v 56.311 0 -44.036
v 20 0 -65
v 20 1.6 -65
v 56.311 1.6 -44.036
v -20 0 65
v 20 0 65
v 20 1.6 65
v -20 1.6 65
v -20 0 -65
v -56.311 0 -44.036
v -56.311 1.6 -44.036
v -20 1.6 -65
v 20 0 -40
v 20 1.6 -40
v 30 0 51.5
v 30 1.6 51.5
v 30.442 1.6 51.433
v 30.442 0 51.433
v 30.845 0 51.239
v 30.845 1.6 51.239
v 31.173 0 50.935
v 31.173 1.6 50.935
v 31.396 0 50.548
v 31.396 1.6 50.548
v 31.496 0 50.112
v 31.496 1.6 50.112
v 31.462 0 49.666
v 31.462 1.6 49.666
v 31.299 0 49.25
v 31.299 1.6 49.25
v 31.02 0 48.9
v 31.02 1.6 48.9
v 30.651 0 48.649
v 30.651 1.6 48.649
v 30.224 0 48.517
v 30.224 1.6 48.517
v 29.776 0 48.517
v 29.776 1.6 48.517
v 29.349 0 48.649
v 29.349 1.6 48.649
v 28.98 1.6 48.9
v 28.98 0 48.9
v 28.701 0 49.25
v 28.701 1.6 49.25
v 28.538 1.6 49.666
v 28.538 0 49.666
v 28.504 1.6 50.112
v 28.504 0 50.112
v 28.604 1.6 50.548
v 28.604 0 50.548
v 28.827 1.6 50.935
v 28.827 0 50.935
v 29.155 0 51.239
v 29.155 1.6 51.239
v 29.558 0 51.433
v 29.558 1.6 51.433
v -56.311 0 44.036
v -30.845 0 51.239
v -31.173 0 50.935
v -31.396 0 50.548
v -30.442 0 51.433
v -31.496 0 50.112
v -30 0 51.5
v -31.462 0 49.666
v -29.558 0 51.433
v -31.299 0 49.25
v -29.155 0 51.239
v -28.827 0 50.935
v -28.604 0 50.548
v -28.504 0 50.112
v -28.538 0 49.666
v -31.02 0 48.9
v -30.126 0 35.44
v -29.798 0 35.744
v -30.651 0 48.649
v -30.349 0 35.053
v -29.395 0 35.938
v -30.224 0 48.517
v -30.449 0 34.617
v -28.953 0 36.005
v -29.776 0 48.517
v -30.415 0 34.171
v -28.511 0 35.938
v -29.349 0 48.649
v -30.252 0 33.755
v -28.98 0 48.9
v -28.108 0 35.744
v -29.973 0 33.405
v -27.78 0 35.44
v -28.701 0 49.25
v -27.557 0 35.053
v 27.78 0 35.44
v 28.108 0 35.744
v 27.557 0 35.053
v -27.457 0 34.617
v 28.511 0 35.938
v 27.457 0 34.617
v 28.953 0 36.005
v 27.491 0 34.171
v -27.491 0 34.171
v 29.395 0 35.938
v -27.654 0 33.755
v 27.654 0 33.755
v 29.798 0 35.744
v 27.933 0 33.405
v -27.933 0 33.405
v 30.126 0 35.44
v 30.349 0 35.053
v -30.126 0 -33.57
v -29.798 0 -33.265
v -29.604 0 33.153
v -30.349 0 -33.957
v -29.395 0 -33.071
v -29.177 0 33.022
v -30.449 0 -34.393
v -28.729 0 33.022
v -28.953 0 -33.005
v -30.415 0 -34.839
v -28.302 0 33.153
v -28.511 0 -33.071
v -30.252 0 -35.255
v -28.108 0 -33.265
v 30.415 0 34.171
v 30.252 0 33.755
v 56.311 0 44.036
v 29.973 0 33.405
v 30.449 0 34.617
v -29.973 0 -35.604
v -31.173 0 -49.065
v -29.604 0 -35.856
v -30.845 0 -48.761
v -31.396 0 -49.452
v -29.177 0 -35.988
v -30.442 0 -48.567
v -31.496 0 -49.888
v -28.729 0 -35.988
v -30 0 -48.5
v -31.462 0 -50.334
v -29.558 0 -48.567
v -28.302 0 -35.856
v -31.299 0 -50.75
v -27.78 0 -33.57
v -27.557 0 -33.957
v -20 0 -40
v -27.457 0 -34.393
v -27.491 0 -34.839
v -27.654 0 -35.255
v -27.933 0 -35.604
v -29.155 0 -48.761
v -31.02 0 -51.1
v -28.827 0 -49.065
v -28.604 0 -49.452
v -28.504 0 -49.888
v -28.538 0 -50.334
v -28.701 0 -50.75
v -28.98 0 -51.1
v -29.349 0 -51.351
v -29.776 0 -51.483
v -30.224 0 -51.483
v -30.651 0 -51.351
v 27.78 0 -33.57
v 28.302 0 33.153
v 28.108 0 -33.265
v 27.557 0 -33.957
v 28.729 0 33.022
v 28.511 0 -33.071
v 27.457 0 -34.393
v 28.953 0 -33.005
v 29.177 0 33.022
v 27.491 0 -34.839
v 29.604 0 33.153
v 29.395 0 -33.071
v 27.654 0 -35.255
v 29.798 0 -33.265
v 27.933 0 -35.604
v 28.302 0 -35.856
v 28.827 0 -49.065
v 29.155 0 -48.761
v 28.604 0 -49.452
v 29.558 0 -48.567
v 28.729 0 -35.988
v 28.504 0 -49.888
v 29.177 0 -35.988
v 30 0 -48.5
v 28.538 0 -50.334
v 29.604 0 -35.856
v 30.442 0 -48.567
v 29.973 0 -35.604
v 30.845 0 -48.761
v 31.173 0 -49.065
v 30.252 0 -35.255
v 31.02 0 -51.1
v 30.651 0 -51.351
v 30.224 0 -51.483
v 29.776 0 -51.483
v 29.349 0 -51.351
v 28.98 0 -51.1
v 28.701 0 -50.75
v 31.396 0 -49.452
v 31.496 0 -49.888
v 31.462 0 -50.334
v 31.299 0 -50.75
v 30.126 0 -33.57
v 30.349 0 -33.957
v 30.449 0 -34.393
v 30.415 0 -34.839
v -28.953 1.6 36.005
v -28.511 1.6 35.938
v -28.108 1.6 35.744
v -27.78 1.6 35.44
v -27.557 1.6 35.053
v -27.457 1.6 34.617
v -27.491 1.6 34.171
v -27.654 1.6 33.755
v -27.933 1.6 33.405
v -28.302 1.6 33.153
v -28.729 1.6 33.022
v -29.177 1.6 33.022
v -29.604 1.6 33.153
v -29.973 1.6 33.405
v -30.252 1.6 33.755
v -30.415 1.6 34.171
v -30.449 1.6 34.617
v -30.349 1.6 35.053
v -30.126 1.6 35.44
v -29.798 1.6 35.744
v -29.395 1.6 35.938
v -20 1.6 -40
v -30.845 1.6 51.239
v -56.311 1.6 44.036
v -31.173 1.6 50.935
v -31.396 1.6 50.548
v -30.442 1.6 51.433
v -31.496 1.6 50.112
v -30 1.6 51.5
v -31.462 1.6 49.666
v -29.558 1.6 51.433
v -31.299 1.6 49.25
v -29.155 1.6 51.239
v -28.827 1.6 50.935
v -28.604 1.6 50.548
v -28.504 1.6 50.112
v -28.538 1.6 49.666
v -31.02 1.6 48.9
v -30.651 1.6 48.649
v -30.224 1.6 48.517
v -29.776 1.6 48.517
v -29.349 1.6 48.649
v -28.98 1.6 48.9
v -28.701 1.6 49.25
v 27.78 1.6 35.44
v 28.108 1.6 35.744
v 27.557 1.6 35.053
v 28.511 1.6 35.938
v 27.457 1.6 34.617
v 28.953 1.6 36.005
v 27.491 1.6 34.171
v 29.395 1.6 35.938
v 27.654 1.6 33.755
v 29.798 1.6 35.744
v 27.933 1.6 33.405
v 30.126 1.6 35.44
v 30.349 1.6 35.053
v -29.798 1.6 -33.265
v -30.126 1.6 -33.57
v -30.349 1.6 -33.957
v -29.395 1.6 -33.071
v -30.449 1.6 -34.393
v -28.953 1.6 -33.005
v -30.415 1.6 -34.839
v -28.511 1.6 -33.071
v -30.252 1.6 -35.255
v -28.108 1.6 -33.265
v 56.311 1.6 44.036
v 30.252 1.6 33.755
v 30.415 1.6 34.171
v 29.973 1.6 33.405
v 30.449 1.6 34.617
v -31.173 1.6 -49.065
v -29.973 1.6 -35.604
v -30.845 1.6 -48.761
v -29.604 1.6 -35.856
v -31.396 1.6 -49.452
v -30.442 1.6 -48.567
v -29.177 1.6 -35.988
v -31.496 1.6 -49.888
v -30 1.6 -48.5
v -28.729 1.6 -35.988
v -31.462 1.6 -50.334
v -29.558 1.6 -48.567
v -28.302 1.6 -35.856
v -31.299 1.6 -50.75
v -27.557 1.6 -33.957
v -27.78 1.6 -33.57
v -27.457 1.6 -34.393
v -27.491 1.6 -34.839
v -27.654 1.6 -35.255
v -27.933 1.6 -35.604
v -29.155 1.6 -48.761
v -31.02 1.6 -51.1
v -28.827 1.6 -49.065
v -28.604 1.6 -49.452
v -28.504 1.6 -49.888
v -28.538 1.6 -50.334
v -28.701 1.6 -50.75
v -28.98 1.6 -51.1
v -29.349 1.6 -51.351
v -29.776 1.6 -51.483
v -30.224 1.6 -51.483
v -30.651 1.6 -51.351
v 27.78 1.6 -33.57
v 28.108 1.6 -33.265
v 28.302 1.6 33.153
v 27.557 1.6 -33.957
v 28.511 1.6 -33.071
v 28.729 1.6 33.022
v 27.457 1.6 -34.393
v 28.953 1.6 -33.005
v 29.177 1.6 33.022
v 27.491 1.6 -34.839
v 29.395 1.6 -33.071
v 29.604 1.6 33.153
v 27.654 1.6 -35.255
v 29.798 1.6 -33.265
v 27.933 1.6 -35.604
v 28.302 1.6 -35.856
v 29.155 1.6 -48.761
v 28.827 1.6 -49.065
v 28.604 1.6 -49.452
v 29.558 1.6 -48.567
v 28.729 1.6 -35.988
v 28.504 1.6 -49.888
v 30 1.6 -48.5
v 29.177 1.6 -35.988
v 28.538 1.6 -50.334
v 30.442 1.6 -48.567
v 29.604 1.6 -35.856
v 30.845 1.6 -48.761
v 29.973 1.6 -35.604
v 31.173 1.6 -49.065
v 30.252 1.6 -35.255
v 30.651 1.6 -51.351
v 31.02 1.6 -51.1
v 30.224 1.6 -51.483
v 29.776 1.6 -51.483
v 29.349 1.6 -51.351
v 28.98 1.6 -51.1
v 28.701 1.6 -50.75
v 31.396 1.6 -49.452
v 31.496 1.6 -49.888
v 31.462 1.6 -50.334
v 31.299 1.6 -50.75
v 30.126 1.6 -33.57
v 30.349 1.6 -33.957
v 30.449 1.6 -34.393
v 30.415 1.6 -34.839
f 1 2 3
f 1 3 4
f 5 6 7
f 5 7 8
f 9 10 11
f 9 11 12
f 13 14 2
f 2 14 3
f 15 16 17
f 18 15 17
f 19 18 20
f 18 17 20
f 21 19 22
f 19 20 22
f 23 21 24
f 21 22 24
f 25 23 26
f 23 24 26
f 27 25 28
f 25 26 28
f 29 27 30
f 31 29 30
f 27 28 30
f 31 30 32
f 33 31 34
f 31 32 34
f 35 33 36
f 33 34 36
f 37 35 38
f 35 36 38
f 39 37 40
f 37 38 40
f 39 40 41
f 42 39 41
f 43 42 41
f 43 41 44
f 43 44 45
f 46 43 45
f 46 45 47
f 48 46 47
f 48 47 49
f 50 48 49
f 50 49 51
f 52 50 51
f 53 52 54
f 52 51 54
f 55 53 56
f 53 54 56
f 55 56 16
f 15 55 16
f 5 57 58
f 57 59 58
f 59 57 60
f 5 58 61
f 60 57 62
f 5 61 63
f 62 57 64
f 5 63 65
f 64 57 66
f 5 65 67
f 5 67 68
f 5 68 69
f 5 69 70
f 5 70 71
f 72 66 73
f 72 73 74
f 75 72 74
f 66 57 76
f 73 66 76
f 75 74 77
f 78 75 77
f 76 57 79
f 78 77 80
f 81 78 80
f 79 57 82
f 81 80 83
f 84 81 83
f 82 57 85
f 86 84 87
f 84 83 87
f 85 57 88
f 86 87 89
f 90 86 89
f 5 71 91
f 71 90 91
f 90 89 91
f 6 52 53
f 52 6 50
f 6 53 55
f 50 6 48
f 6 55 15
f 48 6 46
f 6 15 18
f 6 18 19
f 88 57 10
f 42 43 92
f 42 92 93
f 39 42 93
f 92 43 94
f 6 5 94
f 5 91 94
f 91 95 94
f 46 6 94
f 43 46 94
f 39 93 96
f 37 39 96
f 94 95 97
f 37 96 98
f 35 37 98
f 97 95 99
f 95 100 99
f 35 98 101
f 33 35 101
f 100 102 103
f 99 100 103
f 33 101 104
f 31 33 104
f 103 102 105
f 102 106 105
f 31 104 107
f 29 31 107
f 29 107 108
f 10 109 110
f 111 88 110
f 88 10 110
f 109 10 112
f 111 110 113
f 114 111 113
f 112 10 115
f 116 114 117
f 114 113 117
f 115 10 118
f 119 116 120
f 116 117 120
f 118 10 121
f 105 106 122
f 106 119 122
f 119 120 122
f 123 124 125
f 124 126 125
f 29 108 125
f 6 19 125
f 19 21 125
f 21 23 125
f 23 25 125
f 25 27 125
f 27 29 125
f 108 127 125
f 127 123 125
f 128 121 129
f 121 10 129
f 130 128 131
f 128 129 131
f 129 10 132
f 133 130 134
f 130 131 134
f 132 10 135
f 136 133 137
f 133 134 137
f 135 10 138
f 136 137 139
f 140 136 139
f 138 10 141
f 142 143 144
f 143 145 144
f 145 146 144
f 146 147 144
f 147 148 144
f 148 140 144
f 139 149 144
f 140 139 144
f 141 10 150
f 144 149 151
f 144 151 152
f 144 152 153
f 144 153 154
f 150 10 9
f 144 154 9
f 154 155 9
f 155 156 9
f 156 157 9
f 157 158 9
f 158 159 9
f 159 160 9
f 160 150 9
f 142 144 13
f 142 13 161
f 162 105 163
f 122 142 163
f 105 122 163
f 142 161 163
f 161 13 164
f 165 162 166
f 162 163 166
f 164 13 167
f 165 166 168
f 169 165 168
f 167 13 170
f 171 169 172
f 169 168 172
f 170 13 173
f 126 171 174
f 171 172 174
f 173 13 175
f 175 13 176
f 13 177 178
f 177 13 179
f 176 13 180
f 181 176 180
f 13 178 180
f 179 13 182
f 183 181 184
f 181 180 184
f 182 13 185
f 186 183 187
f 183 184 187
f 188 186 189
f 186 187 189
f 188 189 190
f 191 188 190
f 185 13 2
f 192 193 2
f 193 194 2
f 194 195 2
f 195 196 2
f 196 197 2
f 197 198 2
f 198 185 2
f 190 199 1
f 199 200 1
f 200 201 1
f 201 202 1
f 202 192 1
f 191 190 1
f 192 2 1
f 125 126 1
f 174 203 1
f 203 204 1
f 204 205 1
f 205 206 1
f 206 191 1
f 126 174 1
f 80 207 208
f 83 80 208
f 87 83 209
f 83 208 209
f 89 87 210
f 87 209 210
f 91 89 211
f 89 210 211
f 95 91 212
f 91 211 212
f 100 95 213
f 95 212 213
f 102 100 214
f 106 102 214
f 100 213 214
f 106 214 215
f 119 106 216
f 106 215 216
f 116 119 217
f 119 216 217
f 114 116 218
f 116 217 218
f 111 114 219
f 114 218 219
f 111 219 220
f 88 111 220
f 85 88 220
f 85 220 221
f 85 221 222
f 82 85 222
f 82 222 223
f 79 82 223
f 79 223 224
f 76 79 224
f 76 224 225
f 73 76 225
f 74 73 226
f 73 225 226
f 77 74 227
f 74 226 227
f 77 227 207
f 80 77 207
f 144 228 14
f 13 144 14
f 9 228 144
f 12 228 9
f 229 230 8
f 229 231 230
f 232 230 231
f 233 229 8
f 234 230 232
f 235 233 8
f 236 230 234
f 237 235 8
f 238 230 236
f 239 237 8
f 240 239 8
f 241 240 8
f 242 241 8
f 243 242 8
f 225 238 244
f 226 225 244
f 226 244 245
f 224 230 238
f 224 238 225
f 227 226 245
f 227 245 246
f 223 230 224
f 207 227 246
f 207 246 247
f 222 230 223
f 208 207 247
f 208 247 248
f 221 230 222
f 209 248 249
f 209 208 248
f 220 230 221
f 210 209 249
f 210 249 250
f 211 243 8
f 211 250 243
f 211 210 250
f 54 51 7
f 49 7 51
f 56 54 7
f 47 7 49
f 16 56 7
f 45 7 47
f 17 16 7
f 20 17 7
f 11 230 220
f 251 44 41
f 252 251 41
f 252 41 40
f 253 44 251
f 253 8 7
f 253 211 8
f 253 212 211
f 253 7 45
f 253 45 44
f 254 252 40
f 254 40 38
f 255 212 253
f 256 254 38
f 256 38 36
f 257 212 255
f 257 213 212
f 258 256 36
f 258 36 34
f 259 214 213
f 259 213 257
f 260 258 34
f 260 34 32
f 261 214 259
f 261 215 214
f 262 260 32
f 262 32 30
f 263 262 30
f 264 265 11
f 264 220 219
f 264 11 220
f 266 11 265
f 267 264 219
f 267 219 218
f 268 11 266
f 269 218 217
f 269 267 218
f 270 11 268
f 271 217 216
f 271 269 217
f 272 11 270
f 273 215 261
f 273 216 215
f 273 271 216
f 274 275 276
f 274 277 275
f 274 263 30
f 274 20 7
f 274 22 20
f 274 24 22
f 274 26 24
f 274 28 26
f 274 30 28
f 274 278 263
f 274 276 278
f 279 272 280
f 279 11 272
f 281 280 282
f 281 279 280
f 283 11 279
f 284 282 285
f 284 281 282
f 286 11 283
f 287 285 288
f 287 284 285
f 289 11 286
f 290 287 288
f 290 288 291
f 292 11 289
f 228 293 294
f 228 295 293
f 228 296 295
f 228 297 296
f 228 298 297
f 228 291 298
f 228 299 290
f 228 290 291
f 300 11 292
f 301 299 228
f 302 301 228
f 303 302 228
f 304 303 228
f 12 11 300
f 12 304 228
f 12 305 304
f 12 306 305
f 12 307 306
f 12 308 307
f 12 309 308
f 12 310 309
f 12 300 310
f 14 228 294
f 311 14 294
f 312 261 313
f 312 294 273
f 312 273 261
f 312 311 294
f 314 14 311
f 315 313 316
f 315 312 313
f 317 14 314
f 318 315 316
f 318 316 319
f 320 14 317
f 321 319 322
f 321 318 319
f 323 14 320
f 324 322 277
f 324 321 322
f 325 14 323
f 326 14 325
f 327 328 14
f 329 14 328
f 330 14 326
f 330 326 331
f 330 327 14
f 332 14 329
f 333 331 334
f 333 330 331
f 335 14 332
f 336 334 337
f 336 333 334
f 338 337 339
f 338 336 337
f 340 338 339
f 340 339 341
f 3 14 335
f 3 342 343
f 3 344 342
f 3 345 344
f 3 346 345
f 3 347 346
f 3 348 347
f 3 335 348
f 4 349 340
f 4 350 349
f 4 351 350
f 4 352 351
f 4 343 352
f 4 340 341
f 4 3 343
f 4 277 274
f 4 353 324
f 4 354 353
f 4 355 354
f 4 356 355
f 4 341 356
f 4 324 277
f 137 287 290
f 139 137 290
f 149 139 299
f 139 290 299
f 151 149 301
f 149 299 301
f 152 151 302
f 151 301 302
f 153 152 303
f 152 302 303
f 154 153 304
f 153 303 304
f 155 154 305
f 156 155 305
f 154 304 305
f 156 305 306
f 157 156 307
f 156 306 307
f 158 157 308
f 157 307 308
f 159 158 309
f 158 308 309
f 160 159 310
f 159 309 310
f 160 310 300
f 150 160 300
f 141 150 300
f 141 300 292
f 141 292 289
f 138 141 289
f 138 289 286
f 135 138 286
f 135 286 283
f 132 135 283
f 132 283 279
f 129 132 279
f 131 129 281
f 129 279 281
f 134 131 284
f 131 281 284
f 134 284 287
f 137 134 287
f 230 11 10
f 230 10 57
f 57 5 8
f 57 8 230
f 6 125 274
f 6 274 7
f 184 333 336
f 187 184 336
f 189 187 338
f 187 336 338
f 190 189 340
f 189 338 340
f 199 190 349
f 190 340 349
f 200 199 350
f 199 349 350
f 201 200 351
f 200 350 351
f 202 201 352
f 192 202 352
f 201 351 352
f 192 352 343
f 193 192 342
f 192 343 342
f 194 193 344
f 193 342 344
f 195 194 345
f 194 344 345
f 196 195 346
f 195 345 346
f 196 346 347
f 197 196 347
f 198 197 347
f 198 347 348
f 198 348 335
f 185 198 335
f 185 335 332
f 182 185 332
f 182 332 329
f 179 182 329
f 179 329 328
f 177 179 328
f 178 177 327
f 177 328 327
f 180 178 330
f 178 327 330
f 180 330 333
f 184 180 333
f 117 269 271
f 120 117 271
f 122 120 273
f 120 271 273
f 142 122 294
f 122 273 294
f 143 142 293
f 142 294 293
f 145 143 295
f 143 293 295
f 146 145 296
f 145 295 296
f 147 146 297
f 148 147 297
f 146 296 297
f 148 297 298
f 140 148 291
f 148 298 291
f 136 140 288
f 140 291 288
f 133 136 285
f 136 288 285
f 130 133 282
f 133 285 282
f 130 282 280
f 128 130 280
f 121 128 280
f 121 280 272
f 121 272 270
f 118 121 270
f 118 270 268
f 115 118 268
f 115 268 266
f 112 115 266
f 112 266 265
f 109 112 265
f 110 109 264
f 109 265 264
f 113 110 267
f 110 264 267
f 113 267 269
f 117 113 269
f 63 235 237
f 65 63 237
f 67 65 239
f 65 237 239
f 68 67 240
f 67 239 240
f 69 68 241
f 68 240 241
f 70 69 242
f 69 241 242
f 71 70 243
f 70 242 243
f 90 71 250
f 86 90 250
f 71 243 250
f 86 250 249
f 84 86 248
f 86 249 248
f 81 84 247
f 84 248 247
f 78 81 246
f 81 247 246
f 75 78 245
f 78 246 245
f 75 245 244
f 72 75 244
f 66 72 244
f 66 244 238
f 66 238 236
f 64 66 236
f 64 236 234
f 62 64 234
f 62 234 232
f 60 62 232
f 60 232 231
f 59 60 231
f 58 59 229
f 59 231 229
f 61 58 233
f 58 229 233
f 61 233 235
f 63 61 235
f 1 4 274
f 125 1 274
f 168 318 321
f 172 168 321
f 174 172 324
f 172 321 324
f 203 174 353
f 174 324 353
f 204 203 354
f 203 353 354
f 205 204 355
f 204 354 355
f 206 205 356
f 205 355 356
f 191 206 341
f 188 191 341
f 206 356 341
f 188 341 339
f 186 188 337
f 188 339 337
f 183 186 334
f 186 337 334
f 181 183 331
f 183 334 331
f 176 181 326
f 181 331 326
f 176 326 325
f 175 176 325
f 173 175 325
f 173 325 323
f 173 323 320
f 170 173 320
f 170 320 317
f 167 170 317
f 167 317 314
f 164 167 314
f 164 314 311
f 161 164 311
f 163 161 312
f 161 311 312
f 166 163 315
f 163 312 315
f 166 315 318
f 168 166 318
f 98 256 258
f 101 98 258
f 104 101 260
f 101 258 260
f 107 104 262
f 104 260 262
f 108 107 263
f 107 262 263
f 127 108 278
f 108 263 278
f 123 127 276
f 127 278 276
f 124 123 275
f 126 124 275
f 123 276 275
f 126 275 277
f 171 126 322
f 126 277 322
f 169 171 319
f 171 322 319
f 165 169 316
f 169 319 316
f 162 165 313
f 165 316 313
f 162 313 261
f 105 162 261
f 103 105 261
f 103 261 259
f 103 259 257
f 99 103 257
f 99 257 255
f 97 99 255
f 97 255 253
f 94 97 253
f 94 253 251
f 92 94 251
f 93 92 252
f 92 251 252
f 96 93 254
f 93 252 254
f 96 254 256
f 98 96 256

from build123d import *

# Parameters (mm, degrees)
BOSS_EXTRUDE1_DEPTH = 1.6
CUT_EXTRUDE1_DEPTH  = 1.6
SKETCH5_R           = 1.5
CUT_EXTRUDE2_DEPTH  = 1.6
BOSS_EXTRUDE2_DEPTH = 1.6
SKETCH10_R          = 1.5
CUT_EXTRUDE5_DEPTH  = 1.6
CUT_EXTRUDE6_DEPTH  = 1.6
SKETCH14_W          = 40
SKETCH14_H          = 25
CUT_EXTRUDE7_DEPTH  = 1.6
CUT_EXTRUDE10_DEPTH = 1.6


with BuildPart() as part:
    # Sketch3 → Boss-Extrude1 (new body)
    with BuildSketch(Plane(origin=(0, 0, 0), x_dir=(1, 0, 0), z_dir=(0, 1, 0))):
        Polygon((-20, 65), (20, 65), (65, 39.019237886), (65, -39.019237886), (20, -65), (-20, -65), (-65, -39.019237886), (-65, 39.019237886), align=None)
    extrude(amount=BOSS_EXTRUDE1_DEPTH)

    # Sketch4 → Cut-Extrude1 (cut)
    with BuildSketch(Plane(origin=(0, 1.6, 0), x_dir=(1, 0, 0), z_dir=(0, 1, 0))):
        Polygon((-61.579798567, 40.993892105), (-65, 31.596965897), (-65, 39.019237886), align=None)
        Polygon((65, 31.596965897), (61.579798567, 40.993892105), (65, 39.019237886), align=None)
        Polygon((61.579798567, -40.993892105), (65, -39.019237886), (65, -31.596965897), align=None)
        Polygon((-61.579798567, -40.993892105), (-65, -39.019237886), (-65, -31.596965897), align=None)
    extrude(amount=-CUT_EXTRUDE1_DEPTH, mode=Mode.SUBTRACT)

    # Sketch5 → Cut-Extrude2 (cut)
    with BuildSketch(Plane(origin=(0, 1.6, 0), x_dir=(1, 0, 0), z_dir=(0, 1, 0))):
        with Locations(Location((-30, 50, 0), (0, 0, 270))):
            Circle(SKETCH5_R)
        with Locations(Location((30, 50, 0), (0, 0, 270))):
            Circle(SKETCH5_R)
        with Locations(Location((30, -50, 0), (0, 0, 270))):
            Circle(SKETCH5_R)
        with Locations(Location((-30, -50, 0), (0, 0, 270))):
            Circle(SKETCH5_R)
    extrude(amount=-CUT_EXTRUDE2_DEPTH, mode=Mode.SUBTRACT)

    # Sketch6 → Boss-Extrude2 (add)
    with BuildSketch(Plane(origin=(0, 1.6, 0), x_dir=(1, 0, 0), z_dir=(0, 1, 0))):
        Polygon((-65, 31.596965897), (-76.50035508, 0), (-65, -31.596965897), align=None)
        Polygon((65, 31.596965897), (65, -31.596965897), (76.50035508, 0), align=None)
    extrude(amount=-BOSS_EXTRUDE2_DEPTH)

    # Sketch10 → Cut-Extrude5 (cut)
    with BuildSketch(Plane(origin=(0, 1.6, 0), x_dir=(1, 0, 0), z_dir=(0, 1, 0))):
        with Locations(Location((-28.953010595, 34.50485439, 0), (0, 0, 270))):
            Circle(SKETCH10_R)
        with Locations(Location((28.953010595, 34.50485439, 0), (0, 0, 270))):
            Circle(SKETCH10_R)
        with Locations(Location((-28.953010595, -34.50485439, 0), (0, 0, 270))):
            Circle(SKETCH10_R)
        with Locations(Location((28.953010595, -34.50485439, 0), (0, 0, 270))):
            Circle(SKETCH10_R)
    extrude(amount=-CUT_EXTRUDE5_DEPTH, mode=Mode.SUBTRACT)

    # Sketch11 → Cut-Extrude6 (cut)
    with BuildSketch(Plane(origin=(0, 1.6, 0), x_dir=(1, 0, 0), z_dir=(0, 1, 0))):
        Polygon((-68.311024809, 22.5), (-68.311024809, -22.5), (-76.50035508, 0), align=None)
        Polygon((68.311024809, 22.5), (68.311024809, -22.5), (76.50035508, 0), align=None)
    extrude(amount=-CUT_EXTRUDE6_DEPTH, mode=Mode.SUBTRACT)

    # Sketch14 → Cut-Extrude7 (cut)
    with BuildSketch(Plane(origin=(0, 1.6, 0), x_dir=(1, 0, 0), z_dir=(0, 1, 0))):
        with Locations((0, 52.5)):
            Rectangle(SKETCH14_W, SKETCH14_H)
    extrude(amount=-CUT_EXTRUDE7_DEPTH, mode=Mode.SUBTRACT)

    # Sketch17 → Cut-Extrude10 (cut)
    with BuildSketch(Plane(origin=(0, 1.6, 0), x_dir=(1, 0, 0), z_dir=(0, 1, 0))):
        Polygon((-56.311024809, 44.035820052), (-56.311024809, -44.035820052), (-61.579798567, -40.993892105), (-68.311024809, -22.5), (-68.311024809, 22.5), (-61.579798567, 40.993892105), align=None)
        Polygon((68.311024809, 22.5), (61.579798567, 40.993892105), (56.311024809, 44.035820052), (56.311024809, -44.035820052), (61.579798567, -40.993892105), (68.311024809, -22.5), align=None)
    extrude(amount=-CUT_EXTRUDE10_DEPTH, mode=Mode.SUBTRACT)


solid = part.part
